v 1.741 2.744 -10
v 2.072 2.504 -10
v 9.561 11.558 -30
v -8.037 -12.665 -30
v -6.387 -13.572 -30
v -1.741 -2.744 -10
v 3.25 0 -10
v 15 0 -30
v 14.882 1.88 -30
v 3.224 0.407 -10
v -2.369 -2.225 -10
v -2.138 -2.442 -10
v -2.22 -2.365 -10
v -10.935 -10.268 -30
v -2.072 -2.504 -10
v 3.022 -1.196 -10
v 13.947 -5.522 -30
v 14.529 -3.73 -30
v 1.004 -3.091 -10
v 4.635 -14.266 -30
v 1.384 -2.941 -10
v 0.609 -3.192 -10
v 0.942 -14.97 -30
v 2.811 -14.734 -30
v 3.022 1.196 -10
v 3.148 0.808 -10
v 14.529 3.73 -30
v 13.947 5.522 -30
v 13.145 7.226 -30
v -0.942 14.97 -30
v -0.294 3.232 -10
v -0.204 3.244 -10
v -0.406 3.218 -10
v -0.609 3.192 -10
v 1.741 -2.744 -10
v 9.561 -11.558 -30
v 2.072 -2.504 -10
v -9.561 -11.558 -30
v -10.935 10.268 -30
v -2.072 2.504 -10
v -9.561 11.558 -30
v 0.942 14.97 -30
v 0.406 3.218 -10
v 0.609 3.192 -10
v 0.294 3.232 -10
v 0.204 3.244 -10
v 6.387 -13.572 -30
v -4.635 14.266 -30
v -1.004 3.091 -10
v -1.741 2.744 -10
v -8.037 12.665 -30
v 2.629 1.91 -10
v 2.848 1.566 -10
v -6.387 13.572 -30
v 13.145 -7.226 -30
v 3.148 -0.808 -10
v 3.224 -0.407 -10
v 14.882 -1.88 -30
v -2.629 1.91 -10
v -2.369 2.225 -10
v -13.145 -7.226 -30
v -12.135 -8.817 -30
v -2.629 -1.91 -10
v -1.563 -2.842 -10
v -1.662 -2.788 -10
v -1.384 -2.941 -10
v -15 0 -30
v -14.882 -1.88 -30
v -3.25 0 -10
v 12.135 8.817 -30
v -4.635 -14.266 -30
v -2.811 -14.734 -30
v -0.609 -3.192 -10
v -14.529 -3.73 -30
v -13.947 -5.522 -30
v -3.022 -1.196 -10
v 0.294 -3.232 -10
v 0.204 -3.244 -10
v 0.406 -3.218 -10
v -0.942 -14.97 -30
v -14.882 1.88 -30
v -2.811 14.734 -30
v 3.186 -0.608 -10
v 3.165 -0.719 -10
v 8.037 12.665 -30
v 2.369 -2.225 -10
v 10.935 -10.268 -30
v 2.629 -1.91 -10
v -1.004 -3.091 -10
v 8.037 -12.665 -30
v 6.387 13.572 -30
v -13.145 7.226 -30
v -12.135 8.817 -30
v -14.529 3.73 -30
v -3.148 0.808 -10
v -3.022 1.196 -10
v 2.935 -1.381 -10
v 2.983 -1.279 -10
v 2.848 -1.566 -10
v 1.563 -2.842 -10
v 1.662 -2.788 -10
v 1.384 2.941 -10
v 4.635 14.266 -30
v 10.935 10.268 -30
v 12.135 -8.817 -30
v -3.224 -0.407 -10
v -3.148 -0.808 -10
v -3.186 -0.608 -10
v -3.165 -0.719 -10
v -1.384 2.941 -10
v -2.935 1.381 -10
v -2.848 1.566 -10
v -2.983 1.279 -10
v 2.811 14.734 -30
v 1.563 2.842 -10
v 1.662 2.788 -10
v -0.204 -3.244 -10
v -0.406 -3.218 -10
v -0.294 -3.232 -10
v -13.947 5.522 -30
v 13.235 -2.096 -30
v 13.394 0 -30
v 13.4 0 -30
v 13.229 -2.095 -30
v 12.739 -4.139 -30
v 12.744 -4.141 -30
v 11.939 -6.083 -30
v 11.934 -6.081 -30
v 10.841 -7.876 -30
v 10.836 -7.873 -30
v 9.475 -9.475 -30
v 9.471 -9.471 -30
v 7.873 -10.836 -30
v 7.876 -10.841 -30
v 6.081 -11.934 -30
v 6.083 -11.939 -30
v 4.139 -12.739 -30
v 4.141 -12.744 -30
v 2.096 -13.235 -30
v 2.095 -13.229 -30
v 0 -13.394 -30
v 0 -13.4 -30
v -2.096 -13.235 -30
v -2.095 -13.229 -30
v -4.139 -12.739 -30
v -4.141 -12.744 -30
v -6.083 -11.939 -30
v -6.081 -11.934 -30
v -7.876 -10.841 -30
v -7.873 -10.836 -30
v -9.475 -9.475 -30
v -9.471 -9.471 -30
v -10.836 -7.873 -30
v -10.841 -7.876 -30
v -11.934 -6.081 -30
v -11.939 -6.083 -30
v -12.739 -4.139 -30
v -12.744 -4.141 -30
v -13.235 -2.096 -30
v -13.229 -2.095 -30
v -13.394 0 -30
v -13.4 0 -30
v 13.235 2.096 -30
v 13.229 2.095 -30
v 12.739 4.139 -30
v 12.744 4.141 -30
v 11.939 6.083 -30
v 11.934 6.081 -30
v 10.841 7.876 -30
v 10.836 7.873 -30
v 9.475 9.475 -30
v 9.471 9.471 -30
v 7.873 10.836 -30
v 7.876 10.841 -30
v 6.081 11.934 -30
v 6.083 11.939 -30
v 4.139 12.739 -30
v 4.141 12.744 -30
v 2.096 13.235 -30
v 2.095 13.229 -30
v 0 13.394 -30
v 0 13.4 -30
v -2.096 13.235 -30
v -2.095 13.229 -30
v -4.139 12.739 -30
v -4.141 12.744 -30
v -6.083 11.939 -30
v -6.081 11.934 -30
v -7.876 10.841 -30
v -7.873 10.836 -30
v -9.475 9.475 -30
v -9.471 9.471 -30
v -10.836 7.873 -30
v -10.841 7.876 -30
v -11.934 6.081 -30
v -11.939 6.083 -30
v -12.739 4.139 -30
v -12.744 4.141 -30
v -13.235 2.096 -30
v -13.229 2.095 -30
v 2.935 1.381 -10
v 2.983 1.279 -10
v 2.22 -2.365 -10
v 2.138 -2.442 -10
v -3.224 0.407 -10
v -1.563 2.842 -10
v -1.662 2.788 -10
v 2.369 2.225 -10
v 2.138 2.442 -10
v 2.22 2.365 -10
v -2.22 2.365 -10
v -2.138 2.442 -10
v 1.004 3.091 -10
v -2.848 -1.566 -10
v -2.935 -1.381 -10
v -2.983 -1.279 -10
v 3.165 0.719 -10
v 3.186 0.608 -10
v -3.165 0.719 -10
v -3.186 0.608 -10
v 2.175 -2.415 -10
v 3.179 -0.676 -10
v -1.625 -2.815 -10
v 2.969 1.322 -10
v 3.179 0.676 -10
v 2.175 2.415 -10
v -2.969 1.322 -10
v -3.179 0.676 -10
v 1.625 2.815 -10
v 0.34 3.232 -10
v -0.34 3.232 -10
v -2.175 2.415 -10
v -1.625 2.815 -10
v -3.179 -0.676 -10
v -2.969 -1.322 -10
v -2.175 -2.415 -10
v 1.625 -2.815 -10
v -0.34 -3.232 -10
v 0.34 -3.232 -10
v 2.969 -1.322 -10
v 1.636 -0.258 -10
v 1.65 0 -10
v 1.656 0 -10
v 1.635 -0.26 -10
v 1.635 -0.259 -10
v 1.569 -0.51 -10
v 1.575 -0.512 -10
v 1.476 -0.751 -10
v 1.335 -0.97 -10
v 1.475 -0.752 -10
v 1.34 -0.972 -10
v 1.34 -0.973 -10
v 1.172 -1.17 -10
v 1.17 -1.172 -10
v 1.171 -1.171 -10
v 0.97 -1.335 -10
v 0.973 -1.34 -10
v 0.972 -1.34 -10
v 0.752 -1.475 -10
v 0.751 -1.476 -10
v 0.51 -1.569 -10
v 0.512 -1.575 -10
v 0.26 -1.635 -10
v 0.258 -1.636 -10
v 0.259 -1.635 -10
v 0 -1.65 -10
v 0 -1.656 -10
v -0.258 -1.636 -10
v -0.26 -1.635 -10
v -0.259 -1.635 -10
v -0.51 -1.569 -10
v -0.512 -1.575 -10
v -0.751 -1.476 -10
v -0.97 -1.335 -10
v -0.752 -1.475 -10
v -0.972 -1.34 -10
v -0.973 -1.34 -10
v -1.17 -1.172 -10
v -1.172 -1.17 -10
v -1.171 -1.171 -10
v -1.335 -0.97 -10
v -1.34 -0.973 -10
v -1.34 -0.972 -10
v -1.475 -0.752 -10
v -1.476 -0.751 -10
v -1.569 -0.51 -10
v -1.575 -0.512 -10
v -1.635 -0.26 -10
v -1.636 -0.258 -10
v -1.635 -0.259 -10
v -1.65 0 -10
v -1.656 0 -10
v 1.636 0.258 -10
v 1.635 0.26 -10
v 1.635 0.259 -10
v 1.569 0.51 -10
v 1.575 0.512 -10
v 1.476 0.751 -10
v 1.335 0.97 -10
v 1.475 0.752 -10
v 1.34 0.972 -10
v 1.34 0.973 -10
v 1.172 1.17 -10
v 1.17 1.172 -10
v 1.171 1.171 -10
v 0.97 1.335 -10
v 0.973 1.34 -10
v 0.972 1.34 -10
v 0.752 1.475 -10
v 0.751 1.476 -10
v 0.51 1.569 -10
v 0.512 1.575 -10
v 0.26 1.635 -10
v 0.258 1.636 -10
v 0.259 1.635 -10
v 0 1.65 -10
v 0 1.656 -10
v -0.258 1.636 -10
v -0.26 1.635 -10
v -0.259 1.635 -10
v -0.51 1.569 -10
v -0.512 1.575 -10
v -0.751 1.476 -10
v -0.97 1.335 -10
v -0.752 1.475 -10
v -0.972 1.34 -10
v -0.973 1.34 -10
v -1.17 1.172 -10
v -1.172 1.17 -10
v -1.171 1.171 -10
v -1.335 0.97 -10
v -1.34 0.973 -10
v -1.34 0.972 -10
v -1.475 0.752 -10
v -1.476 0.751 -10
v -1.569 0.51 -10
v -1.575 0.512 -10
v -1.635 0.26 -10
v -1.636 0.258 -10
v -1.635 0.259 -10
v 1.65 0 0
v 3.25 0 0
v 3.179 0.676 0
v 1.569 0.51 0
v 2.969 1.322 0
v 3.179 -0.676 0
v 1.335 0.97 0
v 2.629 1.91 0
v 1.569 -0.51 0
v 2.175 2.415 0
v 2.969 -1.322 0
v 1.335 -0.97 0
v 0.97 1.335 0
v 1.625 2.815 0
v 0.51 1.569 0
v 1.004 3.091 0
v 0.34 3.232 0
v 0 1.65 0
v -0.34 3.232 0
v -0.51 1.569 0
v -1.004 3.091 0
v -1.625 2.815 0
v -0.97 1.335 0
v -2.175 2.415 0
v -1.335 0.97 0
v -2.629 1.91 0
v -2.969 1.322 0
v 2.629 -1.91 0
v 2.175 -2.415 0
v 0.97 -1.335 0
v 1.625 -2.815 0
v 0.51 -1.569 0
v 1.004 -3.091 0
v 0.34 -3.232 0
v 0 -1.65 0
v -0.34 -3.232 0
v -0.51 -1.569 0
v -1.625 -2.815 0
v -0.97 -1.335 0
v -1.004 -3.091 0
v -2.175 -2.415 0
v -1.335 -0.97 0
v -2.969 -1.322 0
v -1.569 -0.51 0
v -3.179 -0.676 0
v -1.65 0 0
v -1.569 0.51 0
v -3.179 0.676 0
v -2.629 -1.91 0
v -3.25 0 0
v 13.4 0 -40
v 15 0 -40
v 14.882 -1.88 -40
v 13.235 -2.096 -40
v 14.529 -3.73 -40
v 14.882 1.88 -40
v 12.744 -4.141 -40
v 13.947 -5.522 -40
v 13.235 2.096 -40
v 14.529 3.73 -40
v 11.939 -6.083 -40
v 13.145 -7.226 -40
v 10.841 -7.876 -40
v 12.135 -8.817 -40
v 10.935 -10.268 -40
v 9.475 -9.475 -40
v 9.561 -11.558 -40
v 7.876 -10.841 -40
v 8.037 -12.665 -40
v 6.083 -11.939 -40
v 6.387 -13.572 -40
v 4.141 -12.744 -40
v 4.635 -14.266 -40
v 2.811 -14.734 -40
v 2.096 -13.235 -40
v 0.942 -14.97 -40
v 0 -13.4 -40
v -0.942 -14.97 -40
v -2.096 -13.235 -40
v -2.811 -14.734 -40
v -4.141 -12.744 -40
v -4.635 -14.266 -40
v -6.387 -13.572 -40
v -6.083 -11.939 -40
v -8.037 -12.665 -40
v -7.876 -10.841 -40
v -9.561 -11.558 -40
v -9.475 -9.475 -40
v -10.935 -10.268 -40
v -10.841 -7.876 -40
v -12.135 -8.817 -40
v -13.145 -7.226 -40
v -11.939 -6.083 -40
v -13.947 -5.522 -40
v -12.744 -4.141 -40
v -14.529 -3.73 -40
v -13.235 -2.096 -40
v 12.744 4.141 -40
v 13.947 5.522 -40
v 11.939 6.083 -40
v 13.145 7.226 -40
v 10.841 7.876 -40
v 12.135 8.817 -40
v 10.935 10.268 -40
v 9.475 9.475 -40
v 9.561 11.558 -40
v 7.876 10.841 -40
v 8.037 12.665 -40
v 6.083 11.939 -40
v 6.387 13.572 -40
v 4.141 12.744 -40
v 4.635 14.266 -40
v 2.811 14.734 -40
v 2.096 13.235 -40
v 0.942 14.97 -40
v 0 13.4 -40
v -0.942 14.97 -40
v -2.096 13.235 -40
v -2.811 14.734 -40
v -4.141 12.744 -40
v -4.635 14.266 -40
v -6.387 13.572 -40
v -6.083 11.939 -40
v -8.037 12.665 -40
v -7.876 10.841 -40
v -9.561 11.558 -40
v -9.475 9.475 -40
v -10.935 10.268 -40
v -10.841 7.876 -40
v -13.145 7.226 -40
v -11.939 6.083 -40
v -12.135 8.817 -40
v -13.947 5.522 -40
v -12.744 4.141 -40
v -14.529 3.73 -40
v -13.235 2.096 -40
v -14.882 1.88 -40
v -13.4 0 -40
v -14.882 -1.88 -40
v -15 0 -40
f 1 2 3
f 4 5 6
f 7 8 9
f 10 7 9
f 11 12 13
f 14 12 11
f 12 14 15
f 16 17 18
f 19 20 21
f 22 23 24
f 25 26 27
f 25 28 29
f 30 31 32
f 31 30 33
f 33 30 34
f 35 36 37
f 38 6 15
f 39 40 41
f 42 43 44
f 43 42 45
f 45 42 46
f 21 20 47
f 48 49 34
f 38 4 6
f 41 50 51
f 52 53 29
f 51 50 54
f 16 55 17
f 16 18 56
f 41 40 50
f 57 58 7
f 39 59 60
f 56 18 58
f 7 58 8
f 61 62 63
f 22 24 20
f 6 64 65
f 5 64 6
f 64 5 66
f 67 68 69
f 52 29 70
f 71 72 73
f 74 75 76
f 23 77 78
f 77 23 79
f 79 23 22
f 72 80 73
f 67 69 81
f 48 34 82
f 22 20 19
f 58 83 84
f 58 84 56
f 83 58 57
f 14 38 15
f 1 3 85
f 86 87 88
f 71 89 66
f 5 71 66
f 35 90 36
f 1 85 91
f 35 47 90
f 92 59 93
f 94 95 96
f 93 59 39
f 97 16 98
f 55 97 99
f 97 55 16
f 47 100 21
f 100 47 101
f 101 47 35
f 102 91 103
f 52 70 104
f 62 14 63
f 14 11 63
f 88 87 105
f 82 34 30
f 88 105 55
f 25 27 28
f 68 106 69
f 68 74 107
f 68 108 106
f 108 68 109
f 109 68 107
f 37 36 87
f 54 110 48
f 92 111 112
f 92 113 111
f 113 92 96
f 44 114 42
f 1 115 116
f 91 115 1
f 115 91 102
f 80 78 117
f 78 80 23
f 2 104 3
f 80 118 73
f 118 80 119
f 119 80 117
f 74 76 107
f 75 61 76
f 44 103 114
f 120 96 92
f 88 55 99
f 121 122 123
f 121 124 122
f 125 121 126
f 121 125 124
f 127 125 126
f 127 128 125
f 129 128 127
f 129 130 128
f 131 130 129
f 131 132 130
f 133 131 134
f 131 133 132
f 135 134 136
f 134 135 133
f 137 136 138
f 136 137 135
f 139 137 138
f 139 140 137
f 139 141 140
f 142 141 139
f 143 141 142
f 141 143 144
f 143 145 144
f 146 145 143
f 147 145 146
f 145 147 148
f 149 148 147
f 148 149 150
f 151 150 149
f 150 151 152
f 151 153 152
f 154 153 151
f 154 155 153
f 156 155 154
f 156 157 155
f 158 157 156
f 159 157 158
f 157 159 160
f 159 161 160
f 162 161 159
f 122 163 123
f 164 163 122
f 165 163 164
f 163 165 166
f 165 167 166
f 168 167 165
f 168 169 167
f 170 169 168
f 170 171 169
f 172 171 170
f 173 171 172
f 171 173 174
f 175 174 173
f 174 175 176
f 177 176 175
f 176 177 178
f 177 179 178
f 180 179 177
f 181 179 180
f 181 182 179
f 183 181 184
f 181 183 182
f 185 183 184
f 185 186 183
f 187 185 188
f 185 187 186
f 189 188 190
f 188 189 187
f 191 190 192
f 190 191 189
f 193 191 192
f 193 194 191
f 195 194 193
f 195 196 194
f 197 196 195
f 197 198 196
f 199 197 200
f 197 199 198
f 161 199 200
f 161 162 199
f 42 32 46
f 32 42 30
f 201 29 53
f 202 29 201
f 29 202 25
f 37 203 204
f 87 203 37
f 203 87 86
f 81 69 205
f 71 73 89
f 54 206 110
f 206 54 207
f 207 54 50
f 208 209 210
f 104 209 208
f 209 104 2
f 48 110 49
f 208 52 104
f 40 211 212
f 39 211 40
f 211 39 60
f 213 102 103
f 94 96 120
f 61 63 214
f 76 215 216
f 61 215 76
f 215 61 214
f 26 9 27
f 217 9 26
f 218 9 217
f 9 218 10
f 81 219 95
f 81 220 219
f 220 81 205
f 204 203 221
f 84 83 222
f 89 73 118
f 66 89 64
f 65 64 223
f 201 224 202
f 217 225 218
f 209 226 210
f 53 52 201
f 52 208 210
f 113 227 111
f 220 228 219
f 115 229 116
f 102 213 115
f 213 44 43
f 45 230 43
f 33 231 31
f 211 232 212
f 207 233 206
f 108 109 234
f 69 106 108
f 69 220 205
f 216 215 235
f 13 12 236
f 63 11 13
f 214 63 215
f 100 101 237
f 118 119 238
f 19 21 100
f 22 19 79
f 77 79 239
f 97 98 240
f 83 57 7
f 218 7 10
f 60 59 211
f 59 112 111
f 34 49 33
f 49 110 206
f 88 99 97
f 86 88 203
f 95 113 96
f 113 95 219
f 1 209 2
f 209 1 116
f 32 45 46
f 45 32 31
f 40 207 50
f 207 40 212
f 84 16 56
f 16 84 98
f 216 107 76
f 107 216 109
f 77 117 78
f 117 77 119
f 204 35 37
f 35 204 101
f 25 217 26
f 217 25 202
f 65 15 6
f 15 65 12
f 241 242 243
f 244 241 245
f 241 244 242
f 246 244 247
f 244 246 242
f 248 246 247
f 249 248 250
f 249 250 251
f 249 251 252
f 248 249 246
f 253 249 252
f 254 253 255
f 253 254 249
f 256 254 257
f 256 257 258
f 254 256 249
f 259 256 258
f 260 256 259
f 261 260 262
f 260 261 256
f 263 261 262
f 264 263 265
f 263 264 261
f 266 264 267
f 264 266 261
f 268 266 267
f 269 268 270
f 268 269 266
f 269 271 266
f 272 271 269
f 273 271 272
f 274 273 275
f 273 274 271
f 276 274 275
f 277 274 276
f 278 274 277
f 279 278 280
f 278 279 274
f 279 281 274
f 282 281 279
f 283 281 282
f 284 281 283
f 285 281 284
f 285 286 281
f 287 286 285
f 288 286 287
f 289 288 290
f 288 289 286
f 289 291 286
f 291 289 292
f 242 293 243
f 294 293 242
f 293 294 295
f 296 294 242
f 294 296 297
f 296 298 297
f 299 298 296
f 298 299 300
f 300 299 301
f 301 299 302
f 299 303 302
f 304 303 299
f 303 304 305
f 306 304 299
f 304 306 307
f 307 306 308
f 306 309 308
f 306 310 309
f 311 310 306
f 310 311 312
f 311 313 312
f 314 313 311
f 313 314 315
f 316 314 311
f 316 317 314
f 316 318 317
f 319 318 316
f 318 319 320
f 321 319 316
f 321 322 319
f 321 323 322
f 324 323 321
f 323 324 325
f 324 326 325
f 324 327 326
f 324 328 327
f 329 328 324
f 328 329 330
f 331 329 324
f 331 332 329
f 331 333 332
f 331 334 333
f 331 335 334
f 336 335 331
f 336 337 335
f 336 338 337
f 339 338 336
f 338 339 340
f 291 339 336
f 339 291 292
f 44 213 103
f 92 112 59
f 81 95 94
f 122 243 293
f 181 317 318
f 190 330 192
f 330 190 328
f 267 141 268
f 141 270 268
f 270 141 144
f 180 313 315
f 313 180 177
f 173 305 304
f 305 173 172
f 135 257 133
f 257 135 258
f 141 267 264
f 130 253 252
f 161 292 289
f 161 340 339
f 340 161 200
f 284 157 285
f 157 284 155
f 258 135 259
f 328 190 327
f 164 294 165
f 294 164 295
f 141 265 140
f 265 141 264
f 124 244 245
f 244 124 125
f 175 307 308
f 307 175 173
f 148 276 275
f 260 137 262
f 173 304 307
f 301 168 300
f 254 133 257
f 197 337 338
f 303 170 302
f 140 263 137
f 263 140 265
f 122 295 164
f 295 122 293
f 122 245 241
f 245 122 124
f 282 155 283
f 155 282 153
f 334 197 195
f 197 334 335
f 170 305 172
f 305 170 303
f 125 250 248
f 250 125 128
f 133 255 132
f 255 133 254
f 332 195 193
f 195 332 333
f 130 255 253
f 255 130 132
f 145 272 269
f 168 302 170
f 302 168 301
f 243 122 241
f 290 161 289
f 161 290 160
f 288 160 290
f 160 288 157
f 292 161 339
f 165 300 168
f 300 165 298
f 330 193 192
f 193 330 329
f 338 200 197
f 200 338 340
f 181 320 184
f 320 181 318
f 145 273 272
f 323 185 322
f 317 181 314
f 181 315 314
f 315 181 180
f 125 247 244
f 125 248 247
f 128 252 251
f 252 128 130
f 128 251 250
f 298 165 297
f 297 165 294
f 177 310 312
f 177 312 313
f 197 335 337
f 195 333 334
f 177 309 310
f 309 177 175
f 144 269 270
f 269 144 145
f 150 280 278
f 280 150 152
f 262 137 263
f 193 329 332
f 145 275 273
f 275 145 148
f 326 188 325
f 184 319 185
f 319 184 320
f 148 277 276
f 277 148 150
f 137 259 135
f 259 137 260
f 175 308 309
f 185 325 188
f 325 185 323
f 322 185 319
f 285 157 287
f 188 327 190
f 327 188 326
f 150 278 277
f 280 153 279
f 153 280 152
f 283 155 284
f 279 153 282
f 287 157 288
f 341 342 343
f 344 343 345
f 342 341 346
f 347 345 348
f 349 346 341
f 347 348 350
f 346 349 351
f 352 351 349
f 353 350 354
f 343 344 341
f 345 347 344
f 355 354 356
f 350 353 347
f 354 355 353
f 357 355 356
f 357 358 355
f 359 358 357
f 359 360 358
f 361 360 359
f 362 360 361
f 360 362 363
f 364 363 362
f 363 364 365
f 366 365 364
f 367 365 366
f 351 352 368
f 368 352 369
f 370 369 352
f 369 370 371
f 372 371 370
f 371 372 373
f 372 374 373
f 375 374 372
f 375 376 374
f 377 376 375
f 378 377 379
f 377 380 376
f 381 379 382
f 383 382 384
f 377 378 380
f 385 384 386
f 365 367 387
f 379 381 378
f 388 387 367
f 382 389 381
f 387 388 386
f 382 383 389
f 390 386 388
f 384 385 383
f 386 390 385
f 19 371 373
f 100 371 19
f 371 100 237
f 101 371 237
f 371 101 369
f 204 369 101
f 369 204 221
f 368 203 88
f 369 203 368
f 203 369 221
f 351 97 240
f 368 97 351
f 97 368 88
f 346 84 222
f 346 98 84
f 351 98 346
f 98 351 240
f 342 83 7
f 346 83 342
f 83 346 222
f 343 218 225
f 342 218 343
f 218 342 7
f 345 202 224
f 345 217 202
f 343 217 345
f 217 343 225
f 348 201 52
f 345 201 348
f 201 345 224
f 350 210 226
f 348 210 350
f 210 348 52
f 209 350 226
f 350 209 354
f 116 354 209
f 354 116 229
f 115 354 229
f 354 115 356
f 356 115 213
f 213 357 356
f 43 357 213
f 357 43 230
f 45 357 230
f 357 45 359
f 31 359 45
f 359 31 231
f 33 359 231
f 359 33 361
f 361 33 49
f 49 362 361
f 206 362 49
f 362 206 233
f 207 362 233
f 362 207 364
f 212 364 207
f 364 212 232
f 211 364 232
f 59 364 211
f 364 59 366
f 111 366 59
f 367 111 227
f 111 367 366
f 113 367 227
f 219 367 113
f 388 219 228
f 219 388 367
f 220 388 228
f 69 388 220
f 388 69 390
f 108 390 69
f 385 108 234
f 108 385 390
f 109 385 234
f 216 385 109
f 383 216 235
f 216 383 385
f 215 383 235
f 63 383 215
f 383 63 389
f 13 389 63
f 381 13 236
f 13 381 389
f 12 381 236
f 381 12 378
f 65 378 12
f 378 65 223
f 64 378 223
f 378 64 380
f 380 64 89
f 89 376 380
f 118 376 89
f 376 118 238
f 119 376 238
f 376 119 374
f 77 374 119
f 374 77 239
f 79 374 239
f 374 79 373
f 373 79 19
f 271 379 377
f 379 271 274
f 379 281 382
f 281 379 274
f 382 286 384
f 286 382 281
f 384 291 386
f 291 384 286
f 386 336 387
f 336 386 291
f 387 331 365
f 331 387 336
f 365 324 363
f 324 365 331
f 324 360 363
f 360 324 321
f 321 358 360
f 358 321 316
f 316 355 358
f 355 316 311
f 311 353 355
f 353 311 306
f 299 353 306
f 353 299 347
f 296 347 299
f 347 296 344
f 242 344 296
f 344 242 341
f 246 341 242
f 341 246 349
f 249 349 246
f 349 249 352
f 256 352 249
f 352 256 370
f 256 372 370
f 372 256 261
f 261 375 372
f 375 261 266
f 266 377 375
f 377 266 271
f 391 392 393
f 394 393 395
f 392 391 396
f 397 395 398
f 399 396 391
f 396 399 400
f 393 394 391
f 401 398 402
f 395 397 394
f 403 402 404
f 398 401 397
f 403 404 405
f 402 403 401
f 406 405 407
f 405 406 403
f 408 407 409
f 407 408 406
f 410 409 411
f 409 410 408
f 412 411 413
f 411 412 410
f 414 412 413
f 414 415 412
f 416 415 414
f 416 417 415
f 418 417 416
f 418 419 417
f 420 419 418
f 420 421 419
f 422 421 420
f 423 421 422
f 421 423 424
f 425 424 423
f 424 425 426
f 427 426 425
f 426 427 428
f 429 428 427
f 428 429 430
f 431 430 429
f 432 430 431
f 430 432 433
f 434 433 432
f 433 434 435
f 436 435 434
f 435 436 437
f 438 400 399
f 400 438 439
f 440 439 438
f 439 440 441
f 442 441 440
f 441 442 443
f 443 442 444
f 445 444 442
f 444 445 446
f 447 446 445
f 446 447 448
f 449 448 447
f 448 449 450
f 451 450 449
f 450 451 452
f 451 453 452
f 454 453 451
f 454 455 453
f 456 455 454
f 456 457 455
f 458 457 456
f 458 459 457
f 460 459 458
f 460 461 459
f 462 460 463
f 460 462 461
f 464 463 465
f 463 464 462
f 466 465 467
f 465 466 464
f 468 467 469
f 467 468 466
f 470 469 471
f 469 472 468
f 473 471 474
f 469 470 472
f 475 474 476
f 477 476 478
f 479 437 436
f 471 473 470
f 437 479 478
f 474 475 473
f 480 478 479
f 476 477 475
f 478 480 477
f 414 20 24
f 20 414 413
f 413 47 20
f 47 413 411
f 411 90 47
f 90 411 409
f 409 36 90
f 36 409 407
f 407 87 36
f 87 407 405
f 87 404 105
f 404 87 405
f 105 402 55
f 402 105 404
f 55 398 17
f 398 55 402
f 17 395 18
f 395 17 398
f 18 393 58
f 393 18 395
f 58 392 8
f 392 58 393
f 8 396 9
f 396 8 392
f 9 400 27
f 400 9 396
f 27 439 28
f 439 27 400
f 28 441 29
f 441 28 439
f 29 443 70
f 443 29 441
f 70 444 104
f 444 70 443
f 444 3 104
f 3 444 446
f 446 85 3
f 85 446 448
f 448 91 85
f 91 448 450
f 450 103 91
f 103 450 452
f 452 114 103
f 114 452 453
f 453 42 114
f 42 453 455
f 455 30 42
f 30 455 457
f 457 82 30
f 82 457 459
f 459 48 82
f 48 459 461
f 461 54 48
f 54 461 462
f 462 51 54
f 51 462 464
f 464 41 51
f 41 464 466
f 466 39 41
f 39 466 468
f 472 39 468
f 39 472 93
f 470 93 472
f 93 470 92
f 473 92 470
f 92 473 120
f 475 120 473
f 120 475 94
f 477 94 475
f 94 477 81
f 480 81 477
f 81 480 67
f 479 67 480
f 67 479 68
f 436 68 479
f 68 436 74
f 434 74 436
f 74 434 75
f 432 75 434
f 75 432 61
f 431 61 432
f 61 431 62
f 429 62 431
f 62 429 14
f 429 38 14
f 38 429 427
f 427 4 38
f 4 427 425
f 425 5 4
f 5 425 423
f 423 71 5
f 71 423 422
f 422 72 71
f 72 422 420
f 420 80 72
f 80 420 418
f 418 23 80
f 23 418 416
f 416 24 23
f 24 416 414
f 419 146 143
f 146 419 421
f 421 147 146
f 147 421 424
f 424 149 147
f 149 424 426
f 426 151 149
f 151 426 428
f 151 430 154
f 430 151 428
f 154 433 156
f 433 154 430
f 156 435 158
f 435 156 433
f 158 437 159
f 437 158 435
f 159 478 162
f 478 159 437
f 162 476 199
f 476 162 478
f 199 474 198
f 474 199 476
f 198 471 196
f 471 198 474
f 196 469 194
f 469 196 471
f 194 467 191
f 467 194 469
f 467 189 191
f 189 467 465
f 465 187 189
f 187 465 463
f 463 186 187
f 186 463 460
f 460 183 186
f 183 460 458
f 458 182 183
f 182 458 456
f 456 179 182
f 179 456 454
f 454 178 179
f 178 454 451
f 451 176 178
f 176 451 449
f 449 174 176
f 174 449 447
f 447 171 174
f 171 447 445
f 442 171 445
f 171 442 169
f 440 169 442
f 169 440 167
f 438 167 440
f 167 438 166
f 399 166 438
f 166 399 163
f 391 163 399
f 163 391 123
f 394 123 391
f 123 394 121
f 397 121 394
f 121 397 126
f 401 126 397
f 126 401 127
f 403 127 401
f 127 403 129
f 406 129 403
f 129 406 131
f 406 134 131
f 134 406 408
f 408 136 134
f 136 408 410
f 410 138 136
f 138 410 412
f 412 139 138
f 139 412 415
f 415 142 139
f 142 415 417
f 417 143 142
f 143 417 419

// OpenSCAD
t=1.6;
mirror([0,0,1]) {
linear_extrude(10,convexity=3) difference() {
  circle(d=6.5,$fn=30);
  circle(d=6.5-t*2,$fn=20);
}
translate([0,0,10])
  difference() {
    cylinder(d1=6.5,d2=30,h=20,$fn=50);
    translate([0,0,-.01]) cylinder(d1=6.5-t*2,d2=30-t*2,h=20.02,$fn=40);
  }
 translate([0,0,30])
  linear_extrude(10) difference() { circle(d=30,$fn=50); circle(d=30-t*2,$fn=40);
  }
}
